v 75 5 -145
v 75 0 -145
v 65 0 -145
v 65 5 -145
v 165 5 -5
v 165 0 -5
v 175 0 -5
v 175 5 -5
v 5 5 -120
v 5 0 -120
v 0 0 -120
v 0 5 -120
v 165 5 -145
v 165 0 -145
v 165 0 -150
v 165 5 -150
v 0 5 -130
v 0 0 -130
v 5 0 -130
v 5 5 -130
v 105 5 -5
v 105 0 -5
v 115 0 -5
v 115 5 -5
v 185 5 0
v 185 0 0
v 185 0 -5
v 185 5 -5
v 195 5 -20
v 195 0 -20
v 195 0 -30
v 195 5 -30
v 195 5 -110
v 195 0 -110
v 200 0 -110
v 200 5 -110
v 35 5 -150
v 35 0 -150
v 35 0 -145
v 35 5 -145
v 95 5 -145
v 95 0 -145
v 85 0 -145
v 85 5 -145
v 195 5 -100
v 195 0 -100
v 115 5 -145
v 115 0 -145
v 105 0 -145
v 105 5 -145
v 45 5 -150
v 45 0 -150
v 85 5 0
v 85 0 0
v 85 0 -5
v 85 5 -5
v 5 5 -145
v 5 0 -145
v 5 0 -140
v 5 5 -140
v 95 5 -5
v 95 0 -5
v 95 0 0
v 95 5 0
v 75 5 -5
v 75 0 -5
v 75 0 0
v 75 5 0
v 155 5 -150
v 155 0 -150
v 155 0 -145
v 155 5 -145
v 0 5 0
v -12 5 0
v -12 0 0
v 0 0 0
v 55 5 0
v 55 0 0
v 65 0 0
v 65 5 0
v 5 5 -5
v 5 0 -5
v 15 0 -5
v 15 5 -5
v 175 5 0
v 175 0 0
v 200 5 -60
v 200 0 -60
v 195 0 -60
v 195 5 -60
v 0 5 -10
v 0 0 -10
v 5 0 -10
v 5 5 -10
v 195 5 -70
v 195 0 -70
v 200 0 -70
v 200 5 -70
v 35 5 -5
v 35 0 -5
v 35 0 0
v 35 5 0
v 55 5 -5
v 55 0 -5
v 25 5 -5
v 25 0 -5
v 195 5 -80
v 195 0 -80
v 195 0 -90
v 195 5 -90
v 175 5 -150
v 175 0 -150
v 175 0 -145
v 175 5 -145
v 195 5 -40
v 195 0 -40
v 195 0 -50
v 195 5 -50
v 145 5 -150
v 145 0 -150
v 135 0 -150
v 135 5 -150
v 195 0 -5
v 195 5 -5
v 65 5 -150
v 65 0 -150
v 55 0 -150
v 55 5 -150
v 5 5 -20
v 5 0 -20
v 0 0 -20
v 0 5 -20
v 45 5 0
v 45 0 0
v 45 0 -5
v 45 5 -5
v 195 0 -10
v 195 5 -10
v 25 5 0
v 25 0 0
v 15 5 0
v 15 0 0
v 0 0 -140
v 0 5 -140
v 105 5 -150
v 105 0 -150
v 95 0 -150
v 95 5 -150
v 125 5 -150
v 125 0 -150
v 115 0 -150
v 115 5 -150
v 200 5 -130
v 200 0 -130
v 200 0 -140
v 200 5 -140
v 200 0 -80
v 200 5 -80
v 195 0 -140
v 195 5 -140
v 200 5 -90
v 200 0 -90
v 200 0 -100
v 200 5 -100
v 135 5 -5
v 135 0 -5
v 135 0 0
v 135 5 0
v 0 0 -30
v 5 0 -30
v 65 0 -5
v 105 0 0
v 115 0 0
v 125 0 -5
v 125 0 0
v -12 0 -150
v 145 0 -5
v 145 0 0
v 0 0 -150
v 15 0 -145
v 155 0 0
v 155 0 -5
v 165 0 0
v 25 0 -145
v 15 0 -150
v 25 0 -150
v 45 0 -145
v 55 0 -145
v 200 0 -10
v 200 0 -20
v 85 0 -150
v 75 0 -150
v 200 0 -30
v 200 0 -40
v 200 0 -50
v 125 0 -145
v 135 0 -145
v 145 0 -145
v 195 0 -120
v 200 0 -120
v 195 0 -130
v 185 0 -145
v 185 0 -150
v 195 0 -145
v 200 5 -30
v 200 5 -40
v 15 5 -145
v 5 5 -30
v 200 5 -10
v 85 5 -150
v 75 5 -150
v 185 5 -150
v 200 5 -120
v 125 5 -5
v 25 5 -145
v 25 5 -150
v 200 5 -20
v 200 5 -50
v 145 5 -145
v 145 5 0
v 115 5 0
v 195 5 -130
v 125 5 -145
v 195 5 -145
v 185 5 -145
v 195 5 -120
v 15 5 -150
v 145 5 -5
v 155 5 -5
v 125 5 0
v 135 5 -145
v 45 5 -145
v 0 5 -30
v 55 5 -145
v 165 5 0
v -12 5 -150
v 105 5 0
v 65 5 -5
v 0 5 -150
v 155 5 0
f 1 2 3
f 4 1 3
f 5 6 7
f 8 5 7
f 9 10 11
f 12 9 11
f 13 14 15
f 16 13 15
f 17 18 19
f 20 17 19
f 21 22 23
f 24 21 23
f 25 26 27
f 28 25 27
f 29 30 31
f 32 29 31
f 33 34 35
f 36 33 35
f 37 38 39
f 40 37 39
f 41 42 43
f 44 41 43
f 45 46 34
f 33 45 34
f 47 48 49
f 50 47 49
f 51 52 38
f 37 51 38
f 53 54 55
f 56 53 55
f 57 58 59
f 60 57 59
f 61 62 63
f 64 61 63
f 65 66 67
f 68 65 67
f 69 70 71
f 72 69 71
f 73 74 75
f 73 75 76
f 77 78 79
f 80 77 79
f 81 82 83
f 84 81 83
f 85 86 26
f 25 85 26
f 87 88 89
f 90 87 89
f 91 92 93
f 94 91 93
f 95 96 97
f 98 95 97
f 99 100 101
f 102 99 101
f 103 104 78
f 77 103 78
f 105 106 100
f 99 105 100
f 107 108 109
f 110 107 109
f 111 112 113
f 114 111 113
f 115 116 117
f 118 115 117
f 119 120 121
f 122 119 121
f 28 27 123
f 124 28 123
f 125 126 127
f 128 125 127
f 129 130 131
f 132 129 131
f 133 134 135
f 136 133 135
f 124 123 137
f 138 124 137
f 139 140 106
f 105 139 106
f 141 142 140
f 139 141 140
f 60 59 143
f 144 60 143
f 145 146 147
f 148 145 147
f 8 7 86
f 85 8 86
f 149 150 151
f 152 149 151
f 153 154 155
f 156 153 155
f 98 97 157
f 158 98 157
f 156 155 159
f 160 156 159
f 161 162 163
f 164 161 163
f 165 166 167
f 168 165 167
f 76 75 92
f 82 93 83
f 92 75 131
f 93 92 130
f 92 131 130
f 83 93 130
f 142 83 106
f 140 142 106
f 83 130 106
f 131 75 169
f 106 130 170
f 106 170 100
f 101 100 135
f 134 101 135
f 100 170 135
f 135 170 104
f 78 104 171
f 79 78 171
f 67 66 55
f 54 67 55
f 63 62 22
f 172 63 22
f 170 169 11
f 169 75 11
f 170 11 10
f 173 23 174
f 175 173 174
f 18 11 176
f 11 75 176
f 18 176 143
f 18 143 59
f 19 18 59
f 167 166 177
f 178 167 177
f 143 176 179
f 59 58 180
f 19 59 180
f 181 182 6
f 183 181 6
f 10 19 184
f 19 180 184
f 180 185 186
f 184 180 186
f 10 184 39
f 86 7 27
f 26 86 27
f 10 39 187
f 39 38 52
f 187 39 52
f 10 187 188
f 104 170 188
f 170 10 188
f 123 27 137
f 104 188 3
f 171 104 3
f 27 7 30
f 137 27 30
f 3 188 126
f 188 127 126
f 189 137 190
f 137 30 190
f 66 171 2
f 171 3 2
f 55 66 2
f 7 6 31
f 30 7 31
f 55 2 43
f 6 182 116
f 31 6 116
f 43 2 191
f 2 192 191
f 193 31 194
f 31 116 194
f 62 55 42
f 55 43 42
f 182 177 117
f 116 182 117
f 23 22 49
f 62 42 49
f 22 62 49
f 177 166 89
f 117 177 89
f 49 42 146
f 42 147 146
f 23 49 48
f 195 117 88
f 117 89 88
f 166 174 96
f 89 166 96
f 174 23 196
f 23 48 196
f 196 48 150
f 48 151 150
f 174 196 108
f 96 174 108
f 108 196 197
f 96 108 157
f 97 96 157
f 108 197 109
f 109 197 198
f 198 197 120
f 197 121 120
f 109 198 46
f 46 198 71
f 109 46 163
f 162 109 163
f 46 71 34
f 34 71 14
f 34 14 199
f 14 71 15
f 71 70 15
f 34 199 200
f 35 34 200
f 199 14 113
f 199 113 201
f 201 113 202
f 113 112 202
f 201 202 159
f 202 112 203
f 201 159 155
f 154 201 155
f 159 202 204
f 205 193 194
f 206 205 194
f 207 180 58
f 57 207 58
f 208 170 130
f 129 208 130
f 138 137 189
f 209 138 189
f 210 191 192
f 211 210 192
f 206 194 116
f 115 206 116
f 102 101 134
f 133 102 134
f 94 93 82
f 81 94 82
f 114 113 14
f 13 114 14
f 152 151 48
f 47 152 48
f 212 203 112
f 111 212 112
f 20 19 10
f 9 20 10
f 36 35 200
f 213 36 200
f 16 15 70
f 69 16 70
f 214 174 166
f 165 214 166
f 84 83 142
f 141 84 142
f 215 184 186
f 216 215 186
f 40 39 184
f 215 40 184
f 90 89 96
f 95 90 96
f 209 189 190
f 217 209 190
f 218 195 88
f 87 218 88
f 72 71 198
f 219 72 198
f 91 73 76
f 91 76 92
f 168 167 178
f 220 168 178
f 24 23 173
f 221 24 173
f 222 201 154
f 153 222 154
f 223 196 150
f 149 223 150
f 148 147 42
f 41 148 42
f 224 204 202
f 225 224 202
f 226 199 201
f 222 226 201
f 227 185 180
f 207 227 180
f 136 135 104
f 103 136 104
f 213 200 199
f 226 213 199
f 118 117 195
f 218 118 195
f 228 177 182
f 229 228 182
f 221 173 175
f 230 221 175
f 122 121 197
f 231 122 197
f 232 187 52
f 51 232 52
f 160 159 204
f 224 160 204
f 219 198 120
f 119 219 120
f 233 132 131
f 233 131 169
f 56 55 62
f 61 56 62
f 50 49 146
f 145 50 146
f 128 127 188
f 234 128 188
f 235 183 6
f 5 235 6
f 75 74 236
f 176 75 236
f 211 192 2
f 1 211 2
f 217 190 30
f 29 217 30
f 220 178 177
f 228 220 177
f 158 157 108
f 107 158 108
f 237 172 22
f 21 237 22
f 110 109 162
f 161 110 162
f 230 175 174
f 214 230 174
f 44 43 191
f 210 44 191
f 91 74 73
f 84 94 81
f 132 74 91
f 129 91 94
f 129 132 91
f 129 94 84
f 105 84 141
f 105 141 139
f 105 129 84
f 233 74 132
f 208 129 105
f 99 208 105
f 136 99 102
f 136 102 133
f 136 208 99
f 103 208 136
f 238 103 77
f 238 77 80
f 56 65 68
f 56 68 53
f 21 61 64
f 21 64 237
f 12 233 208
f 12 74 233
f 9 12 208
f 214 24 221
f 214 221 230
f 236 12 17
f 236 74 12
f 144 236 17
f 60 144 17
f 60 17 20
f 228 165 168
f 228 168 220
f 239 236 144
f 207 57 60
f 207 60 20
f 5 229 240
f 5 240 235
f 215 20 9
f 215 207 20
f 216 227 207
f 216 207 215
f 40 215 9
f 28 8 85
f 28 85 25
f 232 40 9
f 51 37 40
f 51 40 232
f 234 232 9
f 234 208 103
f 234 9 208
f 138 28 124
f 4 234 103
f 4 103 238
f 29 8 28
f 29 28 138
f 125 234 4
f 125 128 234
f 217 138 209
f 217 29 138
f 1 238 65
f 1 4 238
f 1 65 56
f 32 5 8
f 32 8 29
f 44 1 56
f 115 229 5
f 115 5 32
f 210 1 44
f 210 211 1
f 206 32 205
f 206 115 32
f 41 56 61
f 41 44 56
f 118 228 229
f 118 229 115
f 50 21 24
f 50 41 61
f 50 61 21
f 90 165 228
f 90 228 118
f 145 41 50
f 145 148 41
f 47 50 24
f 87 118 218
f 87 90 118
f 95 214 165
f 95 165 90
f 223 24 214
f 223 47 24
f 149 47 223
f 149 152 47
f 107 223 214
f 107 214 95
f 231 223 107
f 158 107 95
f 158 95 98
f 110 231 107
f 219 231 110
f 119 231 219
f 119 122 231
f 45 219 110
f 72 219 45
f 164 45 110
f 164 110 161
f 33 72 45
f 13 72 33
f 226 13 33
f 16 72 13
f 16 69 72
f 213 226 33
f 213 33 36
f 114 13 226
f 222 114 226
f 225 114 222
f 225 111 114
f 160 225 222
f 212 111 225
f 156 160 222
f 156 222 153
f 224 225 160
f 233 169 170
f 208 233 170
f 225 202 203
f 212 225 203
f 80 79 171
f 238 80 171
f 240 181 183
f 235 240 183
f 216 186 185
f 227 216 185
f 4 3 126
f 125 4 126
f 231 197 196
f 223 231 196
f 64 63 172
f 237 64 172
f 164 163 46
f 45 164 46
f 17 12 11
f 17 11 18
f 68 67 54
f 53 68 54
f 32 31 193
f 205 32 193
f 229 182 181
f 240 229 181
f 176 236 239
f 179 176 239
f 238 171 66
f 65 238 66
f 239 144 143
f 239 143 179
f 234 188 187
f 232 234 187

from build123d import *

# Parameters (mm, degrees)
SALIENTE_EXTRUIR1_DEPTH = 5
CROQUIS2_W              = 12
CROQUIS2_H              = 150
SALIENTE_EXTRUIR3_DEPTH = 5


with BuildPart() as part:
    # Croquis1 → Saliente-Extruir1 (new body)
    with BuildSketch(Plane(origin=(0, 0, 0), x_dir=(1, 0, 0), z_dir=(0, 1, 0))):
        Polygon((35, 0), (45, 0), (45, 5), (55, 5), (55, 0), (65, 0), (65, 5), (75, 5), (75, 0), (85, 0), (85, 5), (95, 5), (95, 0), (105, 0), (105, 5), (115, 5), (115, 0), (125, 0), (125, 5), (135, 5), (135, 0), (145, 0), (145, 5), (155, 5), (155, 0), (165, 0), (165, 5), (175, 5), (175, 0), (185, 0), (185, 5), (195, 5), (195, 10), (200, 10), (200, 20), (195, 20), (195, 30), (200, 30), (200, 40), (195, 40), (195, 50), (200, 50), (200, 60), (195, 60), (195, 70), (200, 70), (200, 80), (195, 80), (195, 90), (200, 90), (200, 100), (195, 100), (195, 110), (200, 110), (200, 120), (195, 120), (195, 130), (200, 130), (200, 140), (195, 140), (195, 145), (185, 145), (185, 150), (175, 150), (175, 145), (165, 145), (165, 150), (155, 150), (155, 145), (145, 145), (145, 150), (135, 150), (135, 145), (125, 145), (125, 150), (115, 150), (115, 145), (105, 145), (105, 150), (95, 150), (95, 145), (85, 145), (85, 150), (75, 150), (75, 145), (65, 145), (65, 150), (55, 150), (55, 145), (45, 145), (45, 150), (35, 150), (35, 145), (25, 145), (25, 150), (15, 150), (15, 145), (5, 145), (5, 140), (0, 140), (0, 130), (5, 130), (5, 120), (0, 120), (0, 30), (5, 30), (5, 20), (0, 20), (0, 10), (5, 10), (5, 5), (15, 5), (15, 0), (25, 0), (25, 5), (35, 5), align=None)
    extrude(amount=SALIENTE_EXTRUIR1_DEPTH)

    # Croquis2 → Saliente-Extruir3 (add)
    with BuildSketch(Plane(origin=(0, 5, 0), x_dir=(1, 0, 0), z_dir=(0, 1, 0))):
        with Locations((-6, 75)):
            Rectangle(CROQUIS2_W, CROQUIS2_H)
    extrude(amount=-SALIENTE_EXTRUIR3_DEPTH)


solid = part.part
